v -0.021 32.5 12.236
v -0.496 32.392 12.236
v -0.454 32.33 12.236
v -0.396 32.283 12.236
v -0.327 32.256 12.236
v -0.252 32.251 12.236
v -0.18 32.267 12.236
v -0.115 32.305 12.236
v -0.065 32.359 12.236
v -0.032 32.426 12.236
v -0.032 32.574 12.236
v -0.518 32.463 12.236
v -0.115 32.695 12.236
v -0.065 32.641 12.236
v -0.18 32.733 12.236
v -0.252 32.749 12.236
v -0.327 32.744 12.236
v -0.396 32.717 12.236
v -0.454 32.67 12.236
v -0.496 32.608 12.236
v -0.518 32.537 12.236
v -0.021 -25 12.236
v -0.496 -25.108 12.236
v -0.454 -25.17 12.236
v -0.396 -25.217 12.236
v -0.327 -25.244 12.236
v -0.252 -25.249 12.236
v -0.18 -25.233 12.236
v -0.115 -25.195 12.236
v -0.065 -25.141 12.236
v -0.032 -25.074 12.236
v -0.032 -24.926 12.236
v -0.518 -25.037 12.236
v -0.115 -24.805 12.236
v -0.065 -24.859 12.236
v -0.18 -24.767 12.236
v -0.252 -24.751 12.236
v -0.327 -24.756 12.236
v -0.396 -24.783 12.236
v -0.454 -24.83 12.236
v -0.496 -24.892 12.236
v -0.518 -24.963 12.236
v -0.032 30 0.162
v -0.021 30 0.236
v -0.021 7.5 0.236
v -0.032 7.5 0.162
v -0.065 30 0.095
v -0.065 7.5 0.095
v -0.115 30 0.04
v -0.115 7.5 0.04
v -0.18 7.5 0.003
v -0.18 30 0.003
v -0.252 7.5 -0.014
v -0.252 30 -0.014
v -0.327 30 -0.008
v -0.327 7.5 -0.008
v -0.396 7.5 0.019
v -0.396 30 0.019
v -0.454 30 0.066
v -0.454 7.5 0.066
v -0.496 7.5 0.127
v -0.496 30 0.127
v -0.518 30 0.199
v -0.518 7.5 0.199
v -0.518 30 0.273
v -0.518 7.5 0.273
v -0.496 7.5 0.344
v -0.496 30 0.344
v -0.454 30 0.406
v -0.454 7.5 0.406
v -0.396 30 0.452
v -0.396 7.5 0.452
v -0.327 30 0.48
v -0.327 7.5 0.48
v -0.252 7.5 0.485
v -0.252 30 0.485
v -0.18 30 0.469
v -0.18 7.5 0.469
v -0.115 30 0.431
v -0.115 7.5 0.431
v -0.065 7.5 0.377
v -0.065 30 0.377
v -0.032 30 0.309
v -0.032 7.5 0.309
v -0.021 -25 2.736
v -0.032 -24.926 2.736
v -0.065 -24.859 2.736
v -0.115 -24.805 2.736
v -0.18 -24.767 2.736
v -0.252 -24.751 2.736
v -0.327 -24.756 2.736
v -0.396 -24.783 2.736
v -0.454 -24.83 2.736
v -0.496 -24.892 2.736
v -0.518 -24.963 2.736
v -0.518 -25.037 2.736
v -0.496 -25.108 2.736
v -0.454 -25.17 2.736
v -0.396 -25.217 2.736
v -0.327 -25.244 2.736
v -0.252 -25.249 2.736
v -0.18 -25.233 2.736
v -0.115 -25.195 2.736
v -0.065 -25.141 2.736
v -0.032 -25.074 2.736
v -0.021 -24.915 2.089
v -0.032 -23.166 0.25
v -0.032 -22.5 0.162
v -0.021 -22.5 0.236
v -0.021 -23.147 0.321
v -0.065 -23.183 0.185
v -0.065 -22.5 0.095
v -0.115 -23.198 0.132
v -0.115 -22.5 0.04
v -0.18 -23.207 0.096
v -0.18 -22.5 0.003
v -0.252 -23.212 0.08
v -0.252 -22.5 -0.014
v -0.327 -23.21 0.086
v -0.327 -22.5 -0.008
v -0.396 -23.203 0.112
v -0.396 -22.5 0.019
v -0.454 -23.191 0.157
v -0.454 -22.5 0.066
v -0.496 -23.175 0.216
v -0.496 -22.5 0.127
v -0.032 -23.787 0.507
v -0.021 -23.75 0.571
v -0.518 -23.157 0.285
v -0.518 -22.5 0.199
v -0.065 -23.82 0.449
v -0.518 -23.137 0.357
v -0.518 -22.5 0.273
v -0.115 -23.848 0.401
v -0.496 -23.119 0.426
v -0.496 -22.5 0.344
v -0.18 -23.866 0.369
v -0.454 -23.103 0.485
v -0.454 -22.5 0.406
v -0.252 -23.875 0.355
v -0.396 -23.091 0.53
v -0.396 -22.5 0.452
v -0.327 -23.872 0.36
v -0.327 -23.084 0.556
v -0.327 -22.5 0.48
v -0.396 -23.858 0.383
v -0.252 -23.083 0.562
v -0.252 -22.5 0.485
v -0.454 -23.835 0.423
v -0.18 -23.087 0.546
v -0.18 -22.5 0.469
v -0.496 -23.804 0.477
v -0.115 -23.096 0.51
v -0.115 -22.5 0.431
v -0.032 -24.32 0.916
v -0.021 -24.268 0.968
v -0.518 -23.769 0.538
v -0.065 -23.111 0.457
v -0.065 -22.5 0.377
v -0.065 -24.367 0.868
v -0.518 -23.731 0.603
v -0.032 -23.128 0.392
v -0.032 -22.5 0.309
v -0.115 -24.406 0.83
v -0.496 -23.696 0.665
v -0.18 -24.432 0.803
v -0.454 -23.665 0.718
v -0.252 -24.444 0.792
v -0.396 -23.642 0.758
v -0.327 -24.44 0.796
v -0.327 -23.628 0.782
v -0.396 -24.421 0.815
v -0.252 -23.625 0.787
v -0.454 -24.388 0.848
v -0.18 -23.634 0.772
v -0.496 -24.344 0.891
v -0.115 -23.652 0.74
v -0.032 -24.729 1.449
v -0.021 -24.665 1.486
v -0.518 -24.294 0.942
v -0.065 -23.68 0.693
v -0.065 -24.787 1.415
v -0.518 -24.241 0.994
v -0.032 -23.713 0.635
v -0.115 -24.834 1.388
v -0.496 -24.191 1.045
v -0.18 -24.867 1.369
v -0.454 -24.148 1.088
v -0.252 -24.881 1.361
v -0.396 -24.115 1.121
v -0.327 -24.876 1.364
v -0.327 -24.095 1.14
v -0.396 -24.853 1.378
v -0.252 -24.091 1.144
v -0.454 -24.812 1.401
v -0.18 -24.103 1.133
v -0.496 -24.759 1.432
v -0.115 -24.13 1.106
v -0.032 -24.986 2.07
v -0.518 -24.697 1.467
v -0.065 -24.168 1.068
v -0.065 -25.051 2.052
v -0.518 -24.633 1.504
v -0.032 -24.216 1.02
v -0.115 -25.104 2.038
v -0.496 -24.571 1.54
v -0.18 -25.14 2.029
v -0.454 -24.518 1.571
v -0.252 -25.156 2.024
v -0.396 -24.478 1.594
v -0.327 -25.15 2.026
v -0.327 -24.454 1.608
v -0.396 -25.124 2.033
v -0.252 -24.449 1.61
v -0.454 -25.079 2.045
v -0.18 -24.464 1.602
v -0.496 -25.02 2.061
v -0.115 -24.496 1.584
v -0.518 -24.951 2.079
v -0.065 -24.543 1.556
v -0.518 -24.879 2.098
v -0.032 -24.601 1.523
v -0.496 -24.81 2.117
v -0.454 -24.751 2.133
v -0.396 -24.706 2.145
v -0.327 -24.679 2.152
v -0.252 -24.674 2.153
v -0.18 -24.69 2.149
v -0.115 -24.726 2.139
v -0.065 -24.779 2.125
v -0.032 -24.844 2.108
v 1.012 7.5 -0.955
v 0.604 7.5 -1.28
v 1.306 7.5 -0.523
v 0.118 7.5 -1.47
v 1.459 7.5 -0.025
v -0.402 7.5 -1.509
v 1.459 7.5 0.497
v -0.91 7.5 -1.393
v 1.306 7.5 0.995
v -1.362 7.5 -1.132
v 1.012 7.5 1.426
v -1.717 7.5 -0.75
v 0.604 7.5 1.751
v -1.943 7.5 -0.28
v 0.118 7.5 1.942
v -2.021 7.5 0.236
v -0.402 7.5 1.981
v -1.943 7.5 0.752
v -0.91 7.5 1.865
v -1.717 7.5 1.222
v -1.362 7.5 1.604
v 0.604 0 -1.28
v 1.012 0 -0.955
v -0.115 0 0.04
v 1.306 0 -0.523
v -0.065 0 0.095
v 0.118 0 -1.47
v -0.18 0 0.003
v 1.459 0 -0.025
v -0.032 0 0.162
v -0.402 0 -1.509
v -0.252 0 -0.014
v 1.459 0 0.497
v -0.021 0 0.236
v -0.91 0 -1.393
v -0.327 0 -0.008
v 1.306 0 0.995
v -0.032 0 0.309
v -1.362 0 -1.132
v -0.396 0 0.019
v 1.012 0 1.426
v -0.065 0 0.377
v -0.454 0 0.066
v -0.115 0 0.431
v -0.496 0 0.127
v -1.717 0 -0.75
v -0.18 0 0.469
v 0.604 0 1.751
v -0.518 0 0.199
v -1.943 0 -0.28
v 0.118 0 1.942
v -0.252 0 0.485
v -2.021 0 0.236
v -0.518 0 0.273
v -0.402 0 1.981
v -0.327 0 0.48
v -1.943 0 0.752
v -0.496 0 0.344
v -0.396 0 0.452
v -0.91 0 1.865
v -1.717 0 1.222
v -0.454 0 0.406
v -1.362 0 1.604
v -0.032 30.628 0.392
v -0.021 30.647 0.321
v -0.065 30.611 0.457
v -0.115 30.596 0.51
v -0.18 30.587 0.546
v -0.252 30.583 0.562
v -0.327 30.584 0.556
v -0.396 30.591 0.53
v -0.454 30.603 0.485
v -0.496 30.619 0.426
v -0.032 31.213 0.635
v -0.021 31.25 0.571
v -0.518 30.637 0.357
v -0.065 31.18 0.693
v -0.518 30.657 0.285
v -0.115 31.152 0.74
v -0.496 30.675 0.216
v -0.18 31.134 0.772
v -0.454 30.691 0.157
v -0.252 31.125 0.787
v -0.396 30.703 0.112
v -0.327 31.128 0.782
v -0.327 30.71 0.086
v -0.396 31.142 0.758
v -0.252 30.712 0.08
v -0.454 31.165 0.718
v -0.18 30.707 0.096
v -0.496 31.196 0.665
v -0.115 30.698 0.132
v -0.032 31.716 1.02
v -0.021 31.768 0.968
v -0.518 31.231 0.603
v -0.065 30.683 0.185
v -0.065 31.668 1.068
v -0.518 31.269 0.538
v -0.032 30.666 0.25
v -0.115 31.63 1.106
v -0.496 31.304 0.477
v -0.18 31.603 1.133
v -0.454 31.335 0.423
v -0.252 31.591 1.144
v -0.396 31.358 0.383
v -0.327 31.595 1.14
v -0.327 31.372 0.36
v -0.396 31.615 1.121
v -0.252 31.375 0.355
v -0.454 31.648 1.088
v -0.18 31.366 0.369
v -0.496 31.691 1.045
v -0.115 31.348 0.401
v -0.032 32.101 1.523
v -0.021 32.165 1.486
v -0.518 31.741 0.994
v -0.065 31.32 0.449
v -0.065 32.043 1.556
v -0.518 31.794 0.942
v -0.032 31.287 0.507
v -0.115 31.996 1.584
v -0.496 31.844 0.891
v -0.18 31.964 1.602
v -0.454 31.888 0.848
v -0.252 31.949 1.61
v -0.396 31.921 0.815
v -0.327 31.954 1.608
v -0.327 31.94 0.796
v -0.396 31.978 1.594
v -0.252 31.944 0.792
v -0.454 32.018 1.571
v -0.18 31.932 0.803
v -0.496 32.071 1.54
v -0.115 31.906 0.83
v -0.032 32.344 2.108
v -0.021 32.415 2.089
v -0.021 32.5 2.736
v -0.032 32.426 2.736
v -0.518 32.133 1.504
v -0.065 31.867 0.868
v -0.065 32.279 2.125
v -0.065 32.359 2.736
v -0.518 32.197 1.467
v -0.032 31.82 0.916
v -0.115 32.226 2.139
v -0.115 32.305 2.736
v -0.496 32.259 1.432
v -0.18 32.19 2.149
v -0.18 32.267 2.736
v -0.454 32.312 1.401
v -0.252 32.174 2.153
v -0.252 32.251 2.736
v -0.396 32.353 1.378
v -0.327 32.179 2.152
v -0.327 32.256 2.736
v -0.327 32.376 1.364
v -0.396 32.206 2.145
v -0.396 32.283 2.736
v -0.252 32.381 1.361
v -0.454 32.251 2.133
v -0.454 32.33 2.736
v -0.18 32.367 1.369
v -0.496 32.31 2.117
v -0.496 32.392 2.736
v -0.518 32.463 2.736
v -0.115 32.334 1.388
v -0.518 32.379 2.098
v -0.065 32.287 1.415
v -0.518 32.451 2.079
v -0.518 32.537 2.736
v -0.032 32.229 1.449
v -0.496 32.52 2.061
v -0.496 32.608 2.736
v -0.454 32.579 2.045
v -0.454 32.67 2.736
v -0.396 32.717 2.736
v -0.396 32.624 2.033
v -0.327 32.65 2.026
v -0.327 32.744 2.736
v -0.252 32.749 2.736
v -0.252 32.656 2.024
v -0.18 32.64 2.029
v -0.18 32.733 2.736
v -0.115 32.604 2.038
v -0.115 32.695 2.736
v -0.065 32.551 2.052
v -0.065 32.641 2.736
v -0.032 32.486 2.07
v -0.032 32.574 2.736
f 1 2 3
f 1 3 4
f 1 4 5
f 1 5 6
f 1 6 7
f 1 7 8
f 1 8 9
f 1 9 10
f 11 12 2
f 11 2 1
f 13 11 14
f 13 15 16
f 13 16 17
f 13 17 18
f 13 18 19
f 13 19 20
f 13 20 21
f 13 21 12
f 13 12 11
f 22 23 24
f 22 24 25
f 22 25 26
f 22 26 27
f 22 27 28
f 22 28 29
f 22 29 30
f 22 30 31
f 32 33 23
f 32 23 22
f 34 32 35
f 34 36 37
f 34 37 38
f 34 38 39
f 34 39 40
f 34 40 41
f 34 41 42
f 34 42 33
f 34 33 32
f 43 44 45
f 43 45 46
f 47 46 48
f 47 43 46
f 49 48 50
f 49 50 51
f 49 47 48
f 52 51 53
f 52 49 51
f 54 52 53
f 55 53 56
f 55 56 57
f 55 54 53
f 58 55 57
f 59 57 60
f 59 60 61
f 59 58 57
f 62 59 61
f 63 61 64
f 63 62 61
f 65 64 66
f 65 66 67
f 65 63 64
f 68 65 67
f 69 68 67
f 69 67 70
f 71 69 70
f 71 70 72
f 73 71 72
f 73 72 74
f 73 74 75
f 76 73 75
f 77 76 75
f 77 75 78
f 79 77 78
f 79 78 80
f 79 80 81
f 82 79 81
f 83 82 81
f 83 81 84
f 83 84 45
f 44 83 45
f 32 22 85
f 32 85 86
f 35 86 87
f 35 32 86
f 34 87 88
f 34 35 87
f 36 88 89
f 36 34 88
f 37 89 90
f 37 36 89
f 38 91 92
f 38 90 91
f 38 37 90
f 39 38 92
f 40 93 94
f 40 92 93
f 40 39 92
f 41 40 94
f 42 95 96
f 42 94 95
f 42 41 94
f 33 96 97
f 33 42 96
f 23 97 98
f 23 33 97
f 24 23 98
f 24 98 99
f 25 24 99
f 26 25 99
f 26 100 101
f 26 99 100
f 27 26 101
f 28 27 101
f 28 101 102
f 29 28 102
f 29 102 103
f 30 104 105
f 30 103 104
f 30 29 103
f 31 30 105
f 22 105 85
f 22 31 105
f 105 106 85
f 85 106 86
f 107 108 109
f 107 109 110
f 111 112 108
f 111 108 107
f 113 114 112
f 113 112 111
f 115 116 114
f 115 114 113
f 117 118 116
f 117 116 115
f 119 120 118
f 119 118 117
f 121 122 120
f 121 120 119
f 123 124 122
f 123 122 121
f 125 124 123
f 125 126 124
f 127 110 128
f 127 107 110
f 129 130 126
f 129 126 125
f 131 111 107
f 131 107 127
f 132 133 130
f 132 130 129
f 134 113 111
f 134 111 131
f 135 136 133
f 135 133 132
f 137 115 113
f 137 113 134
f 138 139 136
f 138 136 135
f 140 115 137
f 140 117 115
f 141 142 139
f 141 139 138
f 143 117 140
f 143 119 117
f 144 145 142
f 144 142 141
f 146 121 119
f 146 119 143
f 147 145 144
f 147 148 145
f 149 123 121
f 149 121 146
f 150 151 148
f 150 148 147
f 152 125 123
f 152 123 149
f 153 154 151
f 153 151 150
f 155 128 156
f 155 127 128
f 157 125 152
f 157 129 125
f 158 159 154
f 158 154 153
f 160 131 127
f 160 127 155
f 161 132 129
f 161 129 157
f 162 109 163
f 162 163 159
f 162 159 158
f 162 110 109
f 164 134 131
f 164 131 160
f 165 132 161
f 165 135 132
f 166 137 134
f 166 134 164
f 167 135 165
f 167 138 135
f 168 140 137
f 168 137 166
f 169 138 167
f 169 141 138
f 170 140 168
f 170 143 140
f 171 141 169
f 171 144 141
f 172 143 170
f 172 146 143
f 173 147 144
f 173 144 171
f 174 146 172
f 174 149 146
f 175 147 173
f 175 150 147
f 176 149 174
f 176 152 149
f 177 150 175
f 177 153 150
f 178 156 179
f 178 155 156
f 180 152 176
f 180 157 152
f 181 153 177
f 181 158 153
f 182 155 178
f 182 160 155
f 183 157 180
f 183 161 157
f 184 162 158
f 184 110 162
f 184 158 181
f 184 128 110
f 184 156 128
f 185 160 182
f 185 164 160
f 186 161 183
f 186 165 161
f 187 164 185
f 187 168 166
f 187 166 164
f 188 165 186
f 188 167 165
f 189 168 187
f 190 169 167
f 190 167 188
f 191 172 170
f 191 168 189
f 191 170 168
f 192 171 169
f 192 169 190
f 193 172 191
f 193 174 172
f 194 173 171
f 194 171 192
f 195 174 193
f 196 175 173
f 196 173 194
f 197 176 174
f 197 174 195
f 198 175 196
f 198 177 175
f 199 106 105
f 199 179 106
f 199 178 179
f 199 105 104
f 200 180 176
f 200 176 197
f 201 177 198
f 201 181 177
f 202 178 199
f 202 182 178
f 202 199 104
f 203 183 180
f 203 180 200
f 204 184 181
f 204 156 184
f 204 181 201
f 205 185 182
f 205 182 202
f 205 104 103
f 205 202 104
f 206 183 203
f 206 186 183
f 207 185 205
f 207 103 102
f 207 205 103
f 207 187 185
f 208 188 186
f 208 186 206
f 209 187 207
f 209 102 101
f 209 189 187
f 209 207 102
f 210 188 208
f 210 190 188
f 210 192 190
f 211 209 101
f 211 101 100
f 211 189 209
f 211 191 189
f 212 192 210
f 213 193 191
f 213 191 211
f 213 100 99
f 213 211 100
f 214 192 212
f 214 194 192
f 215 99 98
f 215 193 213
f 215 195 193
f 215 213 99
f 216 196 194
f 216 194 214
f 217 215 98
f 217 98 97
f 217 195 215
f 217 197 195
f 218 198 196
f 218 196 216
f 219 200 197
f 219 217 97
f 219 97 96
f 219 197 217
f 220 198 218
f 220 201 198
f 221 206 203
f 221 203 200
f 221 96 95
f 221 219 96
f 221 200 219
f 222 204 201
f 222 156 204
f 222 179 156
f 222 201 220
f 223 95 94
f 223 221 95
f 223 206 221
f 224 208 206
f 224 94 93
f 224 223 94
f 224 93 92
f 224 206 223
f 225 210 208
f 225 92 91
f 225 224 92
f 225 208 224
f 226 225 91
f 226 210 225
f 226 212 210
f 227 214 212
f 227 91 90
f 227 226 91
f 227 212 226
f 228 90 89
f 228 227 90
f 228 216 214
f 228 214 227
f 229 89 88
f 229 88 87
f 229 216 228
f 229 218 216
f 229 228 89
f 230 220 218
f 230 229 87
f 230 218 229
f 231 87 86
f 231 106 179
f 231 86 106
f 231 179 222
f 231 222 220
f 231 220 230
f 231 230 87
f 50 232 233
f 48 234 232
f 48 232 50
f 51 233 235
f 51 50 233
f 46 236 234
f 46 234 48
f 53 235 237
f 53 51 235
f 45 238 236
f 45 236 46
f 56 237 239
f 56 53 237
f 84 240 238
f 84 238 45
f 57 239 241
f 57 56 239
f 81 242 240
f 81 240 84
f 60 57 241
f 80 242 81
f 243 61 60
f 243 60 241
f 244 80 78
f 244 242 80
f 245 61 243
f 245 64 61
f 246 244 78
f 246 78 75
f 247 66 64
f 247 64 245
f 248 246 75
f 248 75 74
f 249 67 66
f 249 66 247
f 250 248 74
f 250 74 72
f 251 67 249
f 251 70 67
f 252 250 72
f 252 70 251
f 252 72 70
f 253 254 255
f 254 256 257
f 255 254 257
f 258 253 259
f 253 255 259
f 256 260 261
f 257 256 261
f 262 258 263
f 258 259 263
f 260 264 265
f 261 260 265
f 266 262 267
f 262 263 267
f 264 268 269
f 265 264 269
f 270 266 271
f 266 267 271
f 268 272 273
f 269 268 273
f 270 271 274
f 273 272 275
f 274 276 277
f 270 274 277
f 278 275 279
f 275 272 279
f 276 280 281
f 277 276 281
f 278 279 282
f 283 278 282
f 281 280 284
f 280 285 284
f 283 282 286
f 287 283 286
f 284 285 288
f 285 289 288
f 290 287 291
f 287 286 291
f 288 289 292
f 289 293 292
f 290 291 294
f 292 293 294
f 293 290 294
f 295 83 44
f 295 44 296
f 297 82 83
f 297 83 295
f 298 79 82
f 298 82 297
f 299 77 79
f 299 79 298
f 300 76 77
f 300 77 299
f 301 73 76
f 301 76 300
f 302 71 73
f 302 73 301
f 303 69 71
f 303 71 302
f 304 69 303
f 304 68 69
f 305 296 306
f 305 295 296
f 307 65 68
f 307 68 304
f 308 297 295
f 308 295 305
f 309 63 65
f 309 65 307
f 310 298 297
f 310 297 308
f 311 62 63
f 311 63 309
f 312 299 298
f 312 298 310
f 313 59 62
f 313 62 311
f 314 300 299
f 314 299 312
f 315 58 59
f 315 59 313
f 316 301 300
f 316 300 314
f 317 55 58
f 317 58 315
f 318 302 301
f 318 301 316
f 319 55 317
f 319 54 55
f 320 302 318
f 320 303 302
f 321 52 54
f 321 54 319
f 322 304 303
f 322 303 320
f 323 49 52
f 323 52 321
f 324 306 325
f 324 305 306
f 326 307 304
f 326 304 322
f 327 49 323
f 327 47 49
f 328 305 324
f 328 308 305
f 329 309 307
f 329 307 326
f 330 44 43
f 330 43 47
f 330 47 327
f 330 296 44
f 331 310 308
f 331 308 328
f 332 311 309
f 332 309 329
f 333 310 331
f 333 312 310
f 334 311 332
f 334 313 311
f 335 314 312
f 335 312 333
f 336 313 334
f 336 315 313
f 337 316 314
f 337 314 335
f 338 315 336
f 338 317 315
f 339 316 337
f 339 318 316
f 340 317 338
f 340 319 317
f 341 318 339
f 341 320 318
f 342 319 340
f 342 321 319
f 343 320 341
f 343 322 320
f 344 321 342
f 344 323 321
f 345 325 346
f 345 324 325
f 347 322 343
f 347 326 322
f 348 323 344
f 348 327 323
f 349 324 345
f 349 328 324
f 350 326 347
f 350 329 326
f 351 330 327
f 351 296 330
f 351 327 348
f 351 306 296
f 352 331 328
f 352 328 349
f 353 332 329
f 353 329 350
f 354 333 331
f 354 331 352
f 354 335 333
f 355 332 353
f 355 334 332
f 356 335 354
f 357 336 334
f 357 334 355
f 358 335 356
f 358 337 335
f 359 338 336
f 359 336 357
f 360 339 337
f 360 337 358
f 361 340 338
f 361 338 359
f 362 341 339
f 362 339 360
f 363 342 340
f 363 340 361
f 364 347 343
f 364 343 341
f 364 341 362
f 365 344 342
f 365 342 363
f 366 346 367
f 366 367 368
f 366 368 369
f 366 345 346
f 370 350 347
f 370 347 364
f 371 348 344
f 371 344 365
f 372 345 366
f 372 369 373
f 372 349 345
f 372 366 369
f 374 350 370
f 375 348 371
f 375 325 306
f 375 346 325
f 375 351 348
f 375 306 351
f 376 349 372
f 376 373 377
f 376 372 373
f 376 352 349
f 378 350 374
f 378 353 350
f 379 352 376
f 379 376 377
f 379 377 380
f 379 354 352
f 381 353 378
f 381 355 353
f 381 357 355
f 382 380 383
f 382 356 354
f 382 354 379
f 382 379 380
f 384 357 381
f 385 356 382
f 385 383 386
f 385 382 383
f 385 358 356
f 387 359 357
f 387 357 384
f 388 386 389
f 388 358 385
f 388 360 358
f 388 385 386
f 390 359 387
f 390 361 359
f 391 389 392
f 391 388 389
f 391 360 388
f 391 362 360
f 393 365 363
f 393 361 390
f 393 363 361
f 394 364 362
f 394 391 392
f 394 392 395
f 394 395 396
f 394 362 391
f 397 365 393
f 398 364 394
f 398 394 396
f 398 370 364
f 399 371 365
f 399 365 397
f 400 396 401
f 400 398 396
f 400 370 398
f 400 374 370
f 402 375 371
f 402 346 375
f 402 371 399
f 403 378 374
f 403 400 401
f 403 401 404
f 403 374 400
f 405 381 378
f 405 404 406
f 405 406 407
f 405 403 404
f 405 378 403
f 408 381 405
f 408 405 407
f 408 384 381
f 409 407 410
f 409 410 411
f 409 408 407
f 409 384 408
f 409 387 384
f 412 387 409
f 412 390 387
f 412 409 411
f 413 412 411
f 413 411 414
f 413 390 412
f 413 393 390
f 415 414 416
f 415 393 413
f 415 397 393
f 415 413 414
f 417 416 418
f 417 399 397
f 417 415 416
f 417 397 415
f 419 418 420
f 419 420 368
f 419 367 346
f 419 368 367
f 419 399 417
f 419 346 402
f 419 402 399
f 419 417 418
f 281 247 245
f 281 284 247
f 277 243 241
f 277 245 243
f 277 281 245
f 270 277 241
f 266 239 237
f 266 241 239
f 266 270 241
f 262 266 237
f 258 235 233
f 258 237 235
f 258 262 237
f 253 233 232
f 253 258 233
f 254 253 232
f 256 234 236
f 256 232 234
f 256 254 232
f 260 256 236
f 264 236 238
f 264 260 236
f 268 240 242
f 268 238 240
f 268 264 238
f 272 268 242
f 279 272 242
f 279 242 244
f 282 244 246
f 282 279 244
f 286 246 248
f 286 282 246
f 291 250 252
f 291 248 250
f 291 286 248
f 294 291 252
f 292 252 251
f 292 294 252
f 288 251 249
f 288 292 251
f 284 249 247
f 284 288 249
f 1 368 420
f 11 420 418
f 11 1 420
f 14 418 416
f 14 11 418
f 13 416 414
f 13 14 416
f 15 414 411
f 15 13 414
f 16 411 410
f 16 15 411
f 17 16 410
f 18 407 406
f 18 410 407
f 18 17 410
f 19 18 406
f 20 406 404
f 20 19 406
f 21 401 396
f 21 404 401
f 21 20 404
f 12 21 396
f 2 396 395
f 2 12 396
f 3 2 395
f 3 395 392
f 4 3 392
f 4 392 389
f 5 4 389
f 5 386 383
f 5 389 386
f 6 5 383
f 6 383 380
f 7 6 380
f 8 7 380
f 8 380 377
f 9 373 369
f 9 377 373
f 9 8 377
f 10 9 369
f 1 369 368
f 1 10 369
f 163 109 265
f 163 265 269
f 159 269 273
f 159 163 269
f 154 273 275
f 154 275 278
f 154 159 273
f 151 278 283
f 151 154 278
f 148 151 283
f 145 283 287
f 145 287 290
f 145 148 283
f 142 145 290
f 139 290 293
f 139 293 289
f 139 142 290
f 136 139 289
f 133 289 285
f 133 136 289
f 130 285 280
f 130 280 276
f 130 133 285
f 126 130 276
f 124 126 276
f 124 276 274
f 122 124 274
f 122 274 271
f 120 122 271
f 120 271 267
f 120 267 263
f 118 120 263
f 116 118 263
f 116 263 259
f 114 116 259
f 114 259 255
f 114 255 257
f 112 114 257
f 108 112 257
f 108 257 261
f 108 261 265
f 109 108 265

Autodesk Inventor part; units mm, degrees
ref_plane "YZ Plane" through (0, 0, 0) normal (1, 0, 0) x (0, 1, 0)
ref_plane "XZ Plane" through (0, 0, 0) normal (0, 1, 0) x (-1, 0, 0)
ref_plane "XY Plane" through (0, 0, 0) normal (0, 0, 1) x (1, 0, 0)
sketch "Sketch1" plane through (0, 0, 0) normal (0, 1, 0) x (-1, 0, 0)
  point P0 (0, 0)
sketch "Sketch2" plane through (0, 0, 0) normal (0, 1, 0) x (-1, 0, 0)
  circle A0 centre (0.2711, 0.2358) radius 1.75
  point P0 (0, 0)
  dimension "d0" = 3.5
extrude "Extrusion1" add sketch "Sketch2" along normal blind 7.5
sketch "Sketch5" plane through (-0.2711, 7.5, 0.2358) normal (0, 1, 0) x (1, 0, 0)
  circle A0 centre (0, 0) radius 0.25 projected
  point P0 (0.2711, 0.2358)
sketch "Sketch8" plane through (-0.2711, 0, 0.2358) normal (0, -1, 0) x (1, 0, 0)
  circle A0 centre (0, 0) radius 0.25
  point P0 (0.2711, -0.2358)
  dimension "d24" = 0.5
sketch3d "3D Sketch3"
  line L0 (-0.2711, 0, 0.2358) -> (-0.2711, -22.5, 0.2358)
  arc A0 (-0.2711, -22.5, 0.2358) -> (-0.2711, -25, 2.7358) centre (-0.2711, -22.5, 2.7358) ccw
  line L1 (-0.2711, -25, 2.7358) -> (-0.2711, -25, 12.2358)
  dimension "d21" = 25
  dimension "d22" = 12
  dimension "d23" = 2.5
sweep "Sweep1" add profiles "Sketch8" path "3D Sketch3"
sketch3d "3D Sketch5"
  line L0 (-0.2711, 7.5, 0.2358) -> (-0.2711, 30, 0.2358)
  arc A0 (-0.2711, 30, 0.2358) -> (-0.2711, 32.5, 2.7358) centre (-0.2711, 30, 2.7358) ccw
  line L1 (-0.2711, 32.5, 2.7358) -> (-0.2711, 32.5, 12.2358)
  dimension "d27" = 25
  dimension "d28" = 12
  dimension "d29" = 2.5
sweep "Sweep2" add profiles "Sketch5" path "3D Sketch5"
properties part number "Diode" material "Silicon Nitride"
